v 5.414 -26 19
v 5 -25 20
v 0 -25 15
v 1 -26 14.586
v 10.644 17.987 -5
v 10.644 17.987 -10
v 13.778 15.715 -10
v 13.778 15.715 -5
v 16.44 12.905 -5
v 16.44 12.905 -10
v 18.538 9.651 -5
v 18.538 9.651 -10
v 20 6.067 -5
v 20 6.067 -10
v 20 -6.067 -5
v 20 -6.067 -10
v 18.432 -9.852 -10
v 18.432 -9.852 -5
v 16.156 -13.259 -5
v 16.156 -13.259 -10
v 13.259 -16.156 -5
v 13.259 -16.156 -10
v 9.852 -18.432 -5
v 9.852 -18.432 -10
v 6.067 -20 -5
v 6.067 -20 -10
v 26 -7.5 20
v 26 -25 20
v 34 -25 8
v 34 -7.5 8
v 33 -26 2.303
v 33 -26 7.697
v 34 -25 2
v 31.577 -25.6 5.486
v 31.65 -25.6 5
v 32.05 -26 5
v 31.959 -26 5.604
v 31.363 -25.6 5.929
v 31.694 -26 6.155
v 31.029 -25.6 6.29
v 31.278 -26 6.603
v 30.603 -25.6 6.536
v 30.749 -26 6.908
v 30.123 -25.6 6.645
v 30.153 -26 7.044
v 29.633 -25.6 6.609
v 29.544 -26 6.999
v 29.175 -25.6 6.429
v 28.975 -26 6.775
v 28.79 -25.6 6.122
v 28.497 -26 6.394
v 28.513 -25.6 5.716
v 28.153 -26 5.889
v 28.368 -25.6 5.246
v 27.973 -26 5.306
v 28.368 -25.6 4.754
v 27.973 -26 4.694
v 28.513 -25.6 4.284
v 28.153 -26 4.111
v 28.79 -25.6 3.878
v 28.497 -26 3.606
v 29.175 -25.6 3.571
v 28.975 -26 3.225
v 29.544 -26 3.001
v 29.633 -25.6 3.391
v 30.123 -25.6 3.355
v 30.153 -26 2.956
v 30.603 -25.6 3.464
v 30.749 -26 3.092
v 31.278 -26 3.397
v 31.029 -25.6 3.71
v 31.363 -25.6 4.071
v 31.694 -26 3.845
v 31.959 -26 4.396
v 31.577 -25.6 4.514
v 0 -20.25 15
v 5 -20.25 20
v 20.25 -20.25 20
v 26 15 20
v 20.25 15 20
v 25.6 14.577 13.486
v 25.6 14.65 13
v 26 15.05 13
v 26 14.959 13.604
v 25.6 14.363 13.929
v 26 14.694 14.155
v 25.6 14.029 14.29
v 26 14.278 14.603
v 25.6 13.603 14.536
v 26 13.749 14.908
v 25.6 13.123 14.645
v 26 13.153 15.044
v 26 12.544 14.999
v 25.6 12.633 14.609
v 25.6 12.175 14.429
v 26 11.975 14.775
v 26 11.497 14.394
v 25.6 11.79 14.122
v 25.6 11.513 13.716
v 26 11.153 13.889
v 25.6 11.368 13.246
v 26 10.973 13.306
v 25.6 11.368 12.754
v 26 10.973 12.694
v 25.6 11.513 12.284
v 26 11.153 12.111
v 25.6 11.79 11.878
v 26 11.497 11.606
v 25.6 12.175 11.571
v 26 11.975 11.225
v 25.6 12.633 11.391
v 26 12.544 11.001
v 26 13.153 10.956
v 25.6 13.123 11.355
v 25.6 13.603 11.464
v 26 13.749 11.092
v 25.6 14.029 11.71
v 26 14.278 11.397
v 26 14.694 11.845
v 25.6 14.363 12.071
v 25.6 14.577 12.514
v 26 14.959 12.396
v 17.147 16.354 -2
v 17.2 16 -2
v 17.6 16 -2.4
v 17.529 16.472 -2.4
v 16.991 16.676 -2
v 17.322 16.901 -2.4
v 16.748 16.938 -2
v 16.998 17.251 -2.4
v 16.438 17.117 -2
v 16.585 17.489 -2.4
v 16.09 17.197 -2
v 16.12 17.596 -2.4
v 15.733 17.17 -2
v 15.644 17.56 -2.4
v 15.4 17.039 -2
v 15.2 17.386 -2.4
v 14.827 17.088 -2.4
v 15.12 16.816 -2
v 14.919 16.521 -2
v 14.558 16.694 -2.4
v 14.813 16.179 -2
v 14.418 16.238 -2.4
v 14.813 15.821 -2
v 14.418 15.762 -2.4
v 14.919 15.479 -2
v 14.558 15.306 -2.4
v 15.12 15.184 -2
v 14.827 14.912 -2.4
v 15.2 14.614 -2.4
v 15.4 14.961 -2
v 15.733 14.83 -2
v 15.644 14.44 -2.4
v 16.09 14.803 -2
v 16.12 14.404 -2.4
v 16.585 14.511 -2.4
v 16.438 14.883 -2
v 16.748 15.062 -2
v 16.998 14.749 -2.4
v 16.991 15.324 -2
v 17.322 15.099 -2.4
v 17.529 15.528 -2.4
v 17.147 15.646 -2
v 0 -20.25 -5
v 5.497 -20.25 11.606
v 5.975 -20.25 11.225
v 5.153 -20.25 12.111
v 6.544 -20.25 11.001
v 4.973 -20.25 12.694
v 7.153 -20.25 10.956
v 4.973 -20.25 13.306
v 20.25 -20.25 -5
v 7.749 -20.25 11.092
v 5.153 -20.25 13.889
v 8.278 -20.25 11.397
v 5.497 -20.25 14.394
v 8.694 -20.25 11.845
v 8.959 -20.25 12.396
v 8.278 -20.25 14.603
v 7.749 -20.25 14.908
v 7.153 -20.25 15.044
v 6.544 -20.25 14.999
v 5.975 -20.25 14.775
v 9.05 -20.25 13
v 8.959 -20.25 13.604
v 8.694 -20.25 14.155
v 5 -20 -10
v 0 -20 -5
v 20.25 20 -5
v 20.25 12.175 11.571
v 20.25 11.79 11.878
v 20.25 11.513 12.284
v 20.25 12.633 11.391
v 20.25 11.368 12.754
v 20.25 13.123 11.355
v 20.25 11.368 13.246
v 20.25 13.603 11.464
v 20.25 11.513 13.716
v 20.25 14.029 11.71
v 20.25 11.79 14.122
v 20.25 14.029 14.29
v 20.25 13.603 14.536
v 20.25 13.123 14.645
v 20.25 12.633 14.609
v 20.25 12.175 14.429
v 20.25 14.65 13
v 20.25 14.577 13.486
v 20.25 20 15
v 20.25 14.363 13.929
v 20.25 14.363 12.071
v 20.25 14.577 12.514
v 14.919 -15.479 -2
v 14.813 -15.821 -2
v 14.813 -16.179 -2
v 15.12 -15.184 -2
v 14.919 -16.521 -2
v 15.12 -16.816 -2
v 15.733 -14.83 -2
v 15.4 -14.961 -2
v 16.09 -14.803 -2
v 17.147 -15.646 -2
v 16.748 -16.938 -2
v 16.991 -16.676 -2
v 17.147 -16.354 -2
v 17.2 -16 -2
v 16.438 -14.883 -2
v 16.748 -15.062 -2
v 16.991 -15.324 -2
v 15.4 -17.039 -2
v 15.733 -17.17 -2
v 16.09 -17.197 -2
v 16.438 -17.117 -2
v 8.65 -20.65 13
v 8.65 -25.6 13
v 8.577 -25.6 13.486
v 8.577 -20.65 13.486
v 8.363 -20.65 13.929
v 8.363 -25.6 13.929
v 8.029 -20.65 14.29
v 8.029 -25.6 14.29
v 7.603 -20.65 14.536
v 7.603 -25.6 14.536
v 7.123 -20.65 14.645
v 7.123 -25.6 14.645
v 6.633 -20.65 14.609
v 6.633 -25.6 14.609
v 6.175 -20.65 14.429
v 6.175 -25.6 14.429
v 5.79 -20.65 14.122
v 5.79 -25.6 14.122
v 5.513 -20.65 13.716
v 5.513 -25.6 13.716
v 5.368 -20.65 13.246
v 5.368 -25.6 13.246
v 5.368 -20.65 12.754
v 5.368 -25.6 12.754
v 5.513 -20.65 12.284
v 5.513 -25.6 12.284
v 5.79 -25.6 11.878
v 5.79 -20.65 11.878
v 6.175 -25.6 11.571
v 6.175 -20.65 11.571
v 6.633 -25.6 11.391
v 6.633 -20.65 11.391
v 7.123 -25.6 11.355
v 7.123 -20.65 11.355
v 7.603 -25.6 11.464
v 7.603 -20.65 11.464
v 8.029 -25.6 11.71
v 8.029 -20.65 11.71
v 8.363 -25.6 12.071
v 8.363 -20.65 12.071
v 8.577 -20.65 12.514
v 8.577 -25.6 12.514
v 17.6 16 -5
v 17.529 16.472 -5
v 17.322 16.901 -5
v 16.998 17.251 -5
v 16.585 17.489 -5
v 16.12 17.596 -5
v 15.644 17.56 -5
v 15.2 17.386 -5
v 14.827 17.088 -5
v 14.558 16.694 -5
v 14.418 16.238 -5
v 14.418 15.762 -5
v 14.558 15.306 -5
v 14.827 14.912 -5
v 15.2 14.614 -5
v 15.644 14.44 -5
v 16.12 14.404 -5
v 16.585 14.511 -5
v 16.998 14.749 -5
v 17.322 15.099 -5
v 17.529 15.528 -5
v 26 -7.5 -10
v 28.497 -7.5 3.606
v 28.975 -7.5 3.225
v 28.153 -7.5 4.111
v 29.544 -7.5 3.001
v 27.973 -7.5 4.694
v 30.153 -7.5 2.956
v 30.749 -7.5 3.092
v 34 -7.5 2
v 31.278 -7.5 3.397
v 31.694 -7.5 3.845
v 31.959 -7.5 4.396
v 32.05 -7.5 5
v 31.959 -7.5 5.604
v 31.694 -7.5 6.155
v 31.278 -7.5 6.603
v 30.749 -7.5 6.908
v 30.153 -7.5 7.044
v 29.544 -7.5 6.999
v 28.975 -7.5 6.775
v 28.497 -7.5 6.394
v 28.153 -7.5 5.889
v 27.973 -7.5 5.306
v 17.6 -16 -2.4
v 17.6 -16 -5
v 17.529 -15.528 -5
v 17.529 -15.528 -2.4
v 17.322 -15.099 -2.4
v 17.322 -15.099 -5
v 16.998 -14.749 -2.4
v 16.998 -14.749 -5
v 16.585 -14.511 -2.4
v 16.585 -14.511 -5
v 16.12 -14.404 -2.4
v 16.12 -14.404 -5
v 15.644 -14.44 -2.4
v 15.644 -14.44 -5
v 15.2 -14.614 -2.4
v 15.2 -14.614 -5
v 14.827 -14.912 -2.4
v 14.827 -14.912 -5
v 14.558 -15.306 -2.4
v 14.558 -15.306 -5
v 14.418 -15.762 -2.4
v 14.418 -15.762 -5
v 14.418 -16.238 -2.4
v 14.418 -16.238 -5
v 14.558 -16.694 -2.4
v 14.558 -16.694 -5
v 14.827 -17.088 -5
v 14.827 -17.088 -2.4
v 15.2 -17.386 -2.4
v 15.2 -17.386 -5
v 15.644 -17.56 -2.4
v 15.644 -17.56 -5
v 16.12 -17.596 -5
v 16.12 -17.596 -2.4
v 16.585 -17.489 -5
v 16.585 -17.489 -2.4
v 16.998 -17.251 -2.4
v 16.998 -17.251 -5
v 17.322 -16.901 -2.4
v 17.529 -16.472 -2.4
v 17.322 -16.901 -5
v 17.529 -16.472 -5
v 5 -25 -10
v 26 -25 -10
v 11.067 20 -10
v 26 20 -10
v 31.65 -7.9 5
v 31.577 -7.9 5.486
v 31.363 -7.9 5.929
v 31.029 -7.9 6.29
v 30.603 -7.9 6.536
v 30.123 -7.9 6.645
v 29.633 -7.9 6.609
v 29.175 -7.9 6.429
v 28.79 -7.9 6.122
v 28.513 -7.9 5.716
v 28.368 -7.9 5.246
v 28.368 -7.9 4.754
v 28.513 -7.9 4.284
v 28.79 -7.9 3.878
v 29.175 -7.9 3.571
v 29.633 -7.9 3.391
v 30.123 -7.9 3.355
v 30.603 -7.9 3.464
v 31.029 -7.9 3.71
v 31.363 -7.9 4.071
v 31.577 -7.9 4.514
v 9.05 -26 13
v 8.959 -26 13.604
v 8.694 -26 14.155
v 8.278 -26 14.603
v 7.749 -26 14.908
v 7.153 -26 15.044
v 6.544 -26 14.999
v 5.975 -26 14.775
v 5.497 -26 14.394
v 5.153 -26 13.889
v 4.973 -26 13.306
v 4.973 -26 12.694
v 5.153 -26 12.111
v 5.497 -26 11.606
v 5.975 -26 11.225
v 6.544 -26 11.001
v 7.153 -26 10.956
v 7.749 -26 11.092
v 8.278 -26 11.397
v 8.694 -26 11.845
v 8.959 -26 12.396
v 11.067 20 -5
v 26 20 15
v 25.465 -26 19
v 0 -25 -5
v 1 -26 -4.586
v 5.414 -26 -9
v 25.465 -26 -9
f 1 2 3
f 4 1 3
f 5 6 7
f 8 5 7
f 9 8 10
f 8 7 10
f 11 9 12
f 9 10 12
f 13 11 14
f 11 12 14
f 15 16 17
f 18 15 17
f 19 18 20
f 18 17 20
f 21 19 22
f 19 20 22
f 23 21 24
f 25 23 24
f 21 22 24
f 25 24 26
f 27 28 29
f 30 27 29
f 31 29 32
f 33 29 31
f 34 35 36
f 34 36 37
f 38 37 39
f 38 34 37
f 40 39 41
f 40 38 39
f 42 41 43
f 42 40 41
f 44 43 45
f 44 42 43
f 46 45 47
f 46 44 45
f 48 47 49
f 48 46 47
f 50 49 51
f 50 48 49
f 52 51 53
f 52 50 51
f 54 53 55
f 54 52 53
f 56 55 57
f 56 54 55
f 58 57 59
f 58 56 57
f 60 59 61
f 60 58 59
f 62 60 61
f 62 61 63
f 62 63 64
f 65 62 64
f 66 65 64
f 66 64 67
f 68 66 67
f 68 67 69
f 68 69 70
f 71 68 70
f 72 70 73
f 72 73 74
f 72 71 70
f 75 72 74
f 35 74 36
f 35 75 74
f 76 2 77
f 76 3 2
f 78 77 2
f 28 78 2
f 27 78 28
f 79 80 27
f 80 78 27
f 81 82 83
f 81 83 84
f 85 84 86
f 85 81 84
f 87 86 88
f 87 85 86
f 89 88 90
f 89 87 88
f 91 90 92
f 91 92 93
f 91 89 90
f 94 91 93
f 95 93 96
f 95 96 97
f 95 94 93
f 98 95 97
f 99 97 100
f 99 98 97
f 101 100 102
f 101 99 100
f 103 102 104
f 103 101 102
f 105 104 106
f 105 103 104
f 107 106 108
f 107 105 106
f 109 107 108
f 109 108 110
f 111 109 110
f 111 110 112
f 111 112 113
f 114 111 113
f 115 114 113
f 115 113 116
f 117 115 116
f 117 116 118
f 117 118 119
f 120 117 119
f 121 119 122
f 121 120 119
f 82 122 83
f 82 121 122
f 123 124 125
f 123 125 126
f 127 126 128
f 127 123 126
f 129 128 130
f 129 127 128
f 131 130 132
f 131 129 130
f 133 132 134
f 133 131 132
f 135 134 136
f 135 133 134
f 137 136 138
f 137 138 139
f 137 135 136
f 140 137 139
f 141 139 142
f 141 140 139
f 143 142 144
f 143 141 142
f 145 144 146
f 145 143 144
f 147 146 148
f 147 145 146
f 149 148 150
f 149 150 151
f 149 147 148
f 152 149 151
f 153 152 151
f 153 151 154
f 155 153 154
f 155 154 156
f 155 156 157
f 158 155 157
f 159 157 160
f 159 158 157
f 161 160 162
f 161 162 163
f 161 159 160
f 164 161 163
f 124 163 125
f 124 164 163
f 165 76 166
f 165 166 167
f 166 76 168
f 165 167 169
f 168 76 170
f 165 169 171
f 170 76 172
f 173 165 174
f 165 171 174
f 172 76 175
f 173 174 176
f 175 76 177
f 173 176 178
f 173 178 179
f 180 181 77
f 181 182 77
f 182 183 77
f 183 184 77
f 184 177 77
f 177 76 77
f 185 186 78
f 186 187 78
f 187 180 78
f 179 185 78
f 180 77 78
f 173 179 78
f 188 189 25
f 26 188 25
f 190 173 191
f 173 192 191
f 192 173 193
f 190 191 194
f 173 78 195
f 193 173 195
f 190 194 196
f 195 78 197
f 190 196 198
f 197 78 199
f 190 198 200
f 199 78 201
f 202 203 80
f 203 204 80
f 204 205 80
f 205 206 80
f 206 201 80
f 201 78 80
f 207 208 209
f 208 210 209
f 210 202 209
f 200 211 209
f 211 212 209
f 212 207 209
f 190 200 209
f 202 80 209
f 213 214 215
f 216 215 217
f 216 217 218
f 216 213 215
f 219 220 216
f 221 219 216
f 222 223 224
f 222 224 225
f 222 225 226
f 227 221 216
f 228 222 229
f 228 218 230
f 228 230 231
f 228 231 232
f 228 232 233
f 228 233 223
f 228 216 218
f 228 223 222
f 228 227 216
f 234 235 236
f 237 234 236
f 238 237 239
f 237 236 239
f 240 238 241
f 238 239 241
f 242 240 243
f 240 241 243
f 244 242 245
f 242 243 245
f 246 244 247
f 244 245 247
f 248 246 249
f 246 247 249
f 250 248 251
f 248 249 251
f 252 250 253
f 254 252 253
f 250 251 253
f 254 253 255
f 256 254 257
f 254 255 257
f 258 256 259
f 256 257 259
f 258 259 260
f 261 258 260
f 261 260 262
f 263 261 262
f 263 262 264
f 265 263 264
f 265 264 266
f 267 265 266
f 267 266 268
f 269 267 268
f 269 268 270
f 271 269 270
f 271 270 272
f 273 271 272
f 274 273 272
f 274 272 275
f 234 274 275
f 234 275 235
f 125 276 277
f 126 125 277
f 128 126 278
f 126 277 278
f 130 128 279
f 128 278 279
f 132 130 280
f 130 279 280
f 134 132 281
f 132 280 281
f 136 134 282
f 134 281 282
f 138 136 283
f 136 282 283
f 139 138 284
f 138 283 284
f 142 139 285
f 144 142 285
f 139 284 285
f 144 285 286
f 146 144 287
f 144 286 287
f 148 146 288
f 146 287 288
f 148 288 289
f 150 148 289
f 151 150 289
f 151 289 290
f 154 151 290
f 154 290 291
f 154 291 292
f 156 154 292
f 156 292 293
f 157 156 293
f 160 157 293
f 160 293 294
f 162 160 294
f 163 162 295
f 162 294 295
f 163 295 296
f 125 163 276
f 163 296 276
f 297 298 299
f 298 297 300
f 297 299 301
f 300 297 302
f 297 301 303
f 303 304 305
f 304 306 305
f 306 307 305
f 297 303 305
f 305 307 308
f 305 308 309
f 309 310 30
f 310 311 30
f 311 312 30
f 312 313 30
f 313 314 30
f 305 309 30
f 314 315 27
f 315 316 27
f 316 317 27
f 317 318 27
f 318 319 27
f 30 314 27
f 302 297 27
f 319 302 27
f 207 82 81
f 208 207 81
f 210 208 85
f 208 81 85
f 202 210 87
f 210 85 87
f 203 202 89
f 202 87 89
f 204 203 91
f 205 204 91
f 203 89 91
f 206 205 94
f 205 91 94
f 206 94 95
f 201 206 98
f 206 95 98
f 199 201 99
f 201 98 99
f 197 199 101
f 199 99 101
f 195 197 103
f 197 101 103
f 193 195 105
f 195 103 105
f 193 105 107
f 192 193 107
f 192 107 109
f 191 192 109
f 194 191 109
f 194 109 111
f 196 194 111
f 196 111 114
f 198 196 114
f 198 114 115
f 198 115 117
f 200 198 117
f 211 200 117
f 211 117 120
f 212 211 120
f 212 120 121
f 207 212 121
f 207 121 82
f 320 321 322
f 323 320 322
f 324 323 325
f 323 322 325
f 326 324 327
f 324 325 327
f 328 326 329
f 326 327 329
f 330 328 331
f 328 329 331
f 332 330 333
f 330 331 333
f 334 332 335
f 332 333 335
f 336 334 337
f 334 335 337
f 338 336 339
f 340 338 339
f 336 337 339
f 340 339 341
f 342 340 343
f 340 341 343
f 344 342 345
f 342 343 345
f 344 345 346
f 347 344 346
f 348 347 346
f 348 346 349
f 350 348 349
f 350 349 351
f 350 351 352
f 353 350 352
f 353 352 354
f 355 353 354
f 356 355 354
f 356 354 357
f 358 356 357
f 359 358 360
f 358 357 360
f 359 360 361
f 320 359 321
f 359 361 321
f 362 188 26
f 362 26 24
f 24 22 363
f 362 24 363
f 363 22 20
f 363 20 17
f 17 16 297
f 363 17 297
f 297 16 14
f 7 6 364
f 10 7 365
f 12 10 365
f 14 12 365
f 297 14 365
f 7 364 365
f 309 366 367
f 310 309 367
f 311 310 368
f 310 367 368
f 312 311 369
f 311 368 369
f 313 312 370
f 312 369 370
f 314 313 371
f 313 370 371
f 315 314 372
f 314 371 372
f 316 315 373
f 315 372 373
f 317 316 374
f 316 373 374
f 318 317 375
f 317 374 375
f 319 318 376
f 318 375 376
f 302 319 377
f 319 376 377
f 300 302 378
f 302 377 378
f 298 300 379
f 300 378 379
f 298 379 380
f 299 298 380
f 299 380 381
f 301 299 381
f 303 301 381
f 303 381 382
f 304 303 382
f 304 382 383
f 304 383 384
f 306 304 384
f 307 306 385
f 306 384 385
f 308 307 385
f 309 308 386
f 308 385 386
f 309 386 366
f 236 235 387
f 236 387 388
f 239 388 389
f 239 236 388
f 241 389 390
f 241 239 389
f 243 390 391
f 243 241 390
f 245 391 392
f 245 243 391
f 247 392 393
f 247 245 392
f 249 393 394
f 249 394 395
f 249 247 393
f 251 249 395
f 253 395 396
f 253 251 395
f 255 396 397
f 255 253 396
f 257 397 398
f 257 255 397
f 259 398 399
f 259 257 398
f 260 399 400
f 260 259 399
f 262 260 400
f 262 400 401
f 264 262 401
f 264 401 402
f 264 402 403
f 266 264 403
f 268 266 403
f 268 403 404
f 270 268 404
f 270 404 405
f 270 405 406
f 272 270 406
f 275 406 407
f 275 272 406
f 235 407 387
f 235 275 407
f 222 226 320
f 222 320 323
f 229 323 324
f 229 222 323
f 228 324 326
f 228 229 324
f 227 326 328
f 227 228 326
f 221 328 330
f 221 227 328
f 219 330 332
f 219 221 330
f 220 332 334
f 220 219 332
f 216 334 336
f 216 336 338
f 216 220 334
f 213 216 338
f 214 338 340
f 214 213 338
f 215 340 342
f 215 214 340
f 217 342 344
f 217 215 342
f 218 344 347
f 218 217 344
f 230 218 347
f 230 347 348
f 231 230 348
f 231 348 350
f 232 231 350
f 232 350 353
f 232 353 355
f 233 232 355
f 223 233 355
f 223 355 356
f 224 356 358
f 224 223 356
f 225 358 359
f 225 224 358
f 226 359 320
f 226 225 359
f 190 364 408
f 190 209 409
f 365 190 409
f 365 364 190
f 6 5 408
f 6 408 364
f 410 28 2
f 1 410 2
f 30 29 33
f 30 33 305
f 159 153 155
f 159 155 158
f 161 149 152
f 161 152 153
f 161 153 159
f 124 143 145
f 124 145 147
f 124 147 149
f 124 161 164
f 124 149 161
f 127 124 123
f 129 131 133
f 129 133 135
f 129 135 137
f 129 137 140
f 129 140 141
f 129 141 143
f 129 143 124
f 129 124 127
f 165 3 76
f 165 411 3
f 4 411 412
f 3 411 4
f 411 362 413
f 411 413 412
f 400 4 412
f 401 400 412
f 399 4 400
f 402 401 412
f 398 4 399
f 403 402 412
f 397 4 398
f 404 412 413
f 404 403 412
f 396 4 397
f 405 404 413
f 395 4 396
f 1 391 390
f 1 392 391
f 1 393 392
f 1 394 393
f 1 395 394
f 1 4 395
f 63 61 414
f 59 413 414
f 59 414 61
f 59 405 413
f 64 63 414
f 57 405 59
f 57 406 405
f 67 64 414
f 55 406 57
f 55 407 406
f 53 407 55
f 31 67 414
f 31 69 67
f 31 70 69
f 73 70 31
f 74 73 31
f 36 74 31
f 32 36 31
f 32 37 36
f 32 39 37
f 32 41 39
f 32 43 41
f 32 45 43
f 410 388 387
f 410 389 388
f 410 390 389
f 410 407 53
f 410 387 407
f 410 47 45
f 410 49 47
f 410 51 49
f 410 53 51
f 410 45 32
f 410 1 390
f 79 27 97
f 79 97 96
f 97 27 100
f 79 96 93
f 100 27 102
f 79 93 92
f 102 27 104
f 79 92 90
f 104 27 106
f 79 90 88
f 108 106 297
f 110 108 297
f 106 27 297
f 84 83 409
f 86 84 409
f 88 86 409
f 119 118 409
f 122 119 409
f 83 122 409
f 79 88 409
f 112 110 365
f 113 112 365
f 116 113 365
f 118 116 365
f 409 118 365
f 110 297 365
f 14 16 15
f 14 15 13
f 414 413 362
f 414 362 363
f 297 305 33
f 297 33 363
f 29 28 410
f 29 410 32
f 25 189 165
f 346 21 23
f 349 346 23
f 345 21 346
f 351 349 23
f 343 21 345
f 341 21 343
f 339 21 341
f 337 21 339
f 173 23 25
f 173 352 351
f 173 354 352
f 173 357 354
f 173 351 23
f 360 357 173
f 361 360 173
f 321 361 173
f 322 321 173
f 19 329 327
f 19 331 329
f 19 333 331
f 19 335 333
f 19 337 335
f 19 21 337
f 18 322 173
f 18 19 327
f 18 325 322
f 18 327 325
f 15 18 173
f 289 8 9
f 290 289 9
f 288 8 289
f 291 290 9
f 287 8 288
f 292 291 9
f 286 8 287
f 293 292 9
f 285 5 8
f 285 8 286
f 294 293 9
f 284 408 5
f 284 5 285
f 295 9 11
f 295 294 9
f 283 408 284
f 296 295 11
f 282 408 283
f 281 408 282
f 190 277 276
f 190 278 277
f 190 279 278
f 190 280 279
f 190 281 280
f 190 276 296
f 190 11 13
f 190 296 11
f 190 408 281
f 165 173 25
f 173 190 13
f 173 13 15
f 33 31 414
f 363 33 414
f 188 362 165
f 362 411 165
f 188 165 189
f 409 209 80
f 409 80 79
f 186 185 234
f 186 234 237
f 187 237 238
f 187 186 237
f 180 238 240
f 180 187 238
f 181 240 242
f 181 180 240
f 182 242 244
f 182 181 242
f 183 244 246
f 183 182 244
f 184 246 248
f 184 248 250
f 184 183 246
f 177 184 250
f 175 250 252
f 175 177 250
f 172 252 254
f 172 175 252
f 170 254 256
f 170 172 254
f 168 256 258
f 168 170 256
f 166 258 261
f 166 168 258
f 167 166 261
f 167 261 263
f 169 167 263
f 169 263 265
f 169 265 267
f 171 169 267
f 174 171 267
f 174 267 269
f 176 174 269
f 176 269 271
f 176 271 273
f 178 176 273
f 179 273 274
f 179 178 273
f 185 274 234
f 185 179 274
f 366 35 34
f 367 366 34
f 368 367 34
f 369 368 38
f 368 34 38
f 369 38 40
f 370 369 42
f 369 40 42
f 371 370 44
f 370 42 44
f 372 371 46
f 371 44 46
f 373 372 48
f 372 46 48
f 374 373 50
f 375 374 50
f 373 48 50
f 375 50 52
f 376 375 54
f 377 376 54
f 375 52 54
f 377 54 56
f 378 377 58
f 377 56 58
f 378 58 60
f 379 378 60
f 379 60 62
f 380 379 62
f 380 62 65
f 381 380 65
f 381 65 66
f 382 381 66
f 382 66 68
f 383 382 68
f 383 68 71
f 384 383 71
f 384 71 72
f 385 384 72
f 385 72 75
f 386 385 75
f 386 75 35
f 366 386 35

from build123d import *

# Parameters (mm, degrees)
SKETCH097_W              = 26
SKETCH097_H              = 46
PAD029_DEPTH             = 30
POCKET062_DEPTH          = 5
SKETCH099_W              = 20.25
SKETCH099_H              = 40.5
POCKET063_DEPTH          = 25
SKETCH100_R              = 1.6
PAD030_DEPTH             = 3
SKETCH101_W              = 8
SKETCH101_H              = 18.5
PAD031_DEPTH             = 30
POCKET064_DEPTH          = 46.001
SKETCH103_R              = 1.65
POCKET065_DEPTH          = 46.001
SKETCH104_R              = 1.65
POCKET066_DEPTH          = 26.001
CHAMFER009002001002_SIZE = 5
CHAMFER009002001003_SIZE = 5
CHAMFER009002001004_SIZE = 1
CHAMFER009002001005_SIZE = 0.4


with BuildPart() as part:
    # Sketch097 → Pad029 (new body)
    with BuildSketch(Plane.XY):
        with Locations((13, -3)):
            Rectangle(SKETCH097_W, SKETCH097_H)
    extrude(amount=PAD029_DEPTH)

    # Sketch098 (on Face5 of Pad029) → Pocket062 (cut)
    with BuildSketch(Plane(origin=(0, 0, 0), x_dir=(1, 0, 0), z_dir=(0, 0, -1))):
        with BuildLine():
            ThreePointArc((-6.067125, 20), (-14.778532, -14.778532), (20, -6.067125))
            Line((20, 6.067125), (20, -6.067125))
            ThreePointArc((20, 6.067125), (14.778532, 14.778532), (6.067125, 20))
            Line((-6.067125, 20), (6.067125, 20))
        make_face()
    extrude(amount=-POCKET062_DEPTH, mode=Mode.SUBTRACT)

    # Sketch099 (on Face6 of Pocket062) → Pocket063 (cut)
    with BuildSketch(Plane.XY.offset(30)):
        with Locations((10.125, 0)):
            Rectangle(SKETCH099_W, SKETCH099_H)
    extrude(amount=-POCKET063_DEPTH, mode=Mode.SUBTRACT)

    # Sketch100 (on Face7 of Pocket063) → Pad030 (join)
    with BuildSketch(Plane.XY.offset(5)):
        with Locations((16, 16)):
            Circle(SKETCH100_R)
        with Locations((16, -16)):
            Circle(SKETCH100_R)
    extrude(amount=PAD030_DEPTH)

    # Sketch101 (on Face5 of Pad030) → Pad031 (join)
    with BuildSketch(Plane.XY.offset(30)):
        with Locations((30, -16.75)):
            Rectangle(SKETCH101_W, SKETCH101_H)
    extrude(amount=-PAD031_DEPTH)

    # Sketch102 (on Face19 of Pad031) → Pocket064 (cut, through all)
    with BuildSketch(Plane.XZ.offset(26)):
        Polygon((34, 12), (26, 0), (34, 0), align=None)
        Polygon((34, 30), (26, 30), (34, 18), align=None)
    extrude(amount=-POCKET064_DEPTH, mode=Mode.SUBTRACT)

    # Sketch103 (on Face21 of Pocket064) → Pocket065 (cut, through all)
    with BuildSketch(Plane.XZ.offset(26)):
        with Locations((7, 23)):
            Circle(SKETCH103_R)
        with Locations((30, 15)):
            Circle(SKETCH103_R)
    extrude(amount=-POCKET065_DEPTH, mode=Mode.SUBTRACT)

    # Sketch104 (on Face4 of Pocket065) → Pocket066 (cut, through all)
    with BuildSketch(Plane.YZ.offset(26)):
        with Locations((13, 23)):
            Circle(SKETCH104_R)
    extrude(amount=-POCKET066_DEPTH, mode=Mode.SUBTRACT)

    # Chamfer009002001002
    chamfer009002001002_edges = [part.edges().sort_by_distance(p)[0] for p in [
        (0, -23.125, 30),
        (23.125, 20, 30),
        (0, -23, 0),
    ]]
    chamfer(chamfer009002001002_edges, length=CHAMFER009002001002_SIZE)

    # Chamfer009002001003
    chamfer009002001003_edges = [part.edges().sort_by_distance(p)[0] for p in [
        (6.067125, 20, 2.5),
    ]]
    chamfer(chamfer009002001003_edges, length=CHAMFER009002001003_SIZE)

    # Chamfer009002001004
    chamfer009002001004_edges = [part.edges().sort_by_distance(p)[0] for p in [
        (0, -26, 15),
        (2.5, -26, 2.5),
        (15.5, -26, 0),
        (30, -26, 6),
        (34, -26, 15),
        (30, -26, 24),
        (2.5, -26, 27.5),
        (15.5, -26, 30),
    ]]
    chamfer(chamfer009002001004_edges, length=CHAMFER009002001004_SIZE)

    # Chamfer009002001005
    chamfer009002001005_edges = [part.edges().sort_by_distance(p)[0] for p in [
        (5.35, -26, 23),
        (28.35, -26, 15),
        (28.35, -7.5, 15),
        (26, 11.35, 23),
        (14.4, 16, 8),
        (14.4, -16, 8),
        (5.35, -20.25, 23),
    ]]
    chamfer(chamfer009002001005_edges, length=CHAMFER009002001005_SIZE)


with BuildPart() as part_1:
    # Body011 placement: moved
    add(part.part.moved(Location((0, 0, -10))))


solid = part_1.part
